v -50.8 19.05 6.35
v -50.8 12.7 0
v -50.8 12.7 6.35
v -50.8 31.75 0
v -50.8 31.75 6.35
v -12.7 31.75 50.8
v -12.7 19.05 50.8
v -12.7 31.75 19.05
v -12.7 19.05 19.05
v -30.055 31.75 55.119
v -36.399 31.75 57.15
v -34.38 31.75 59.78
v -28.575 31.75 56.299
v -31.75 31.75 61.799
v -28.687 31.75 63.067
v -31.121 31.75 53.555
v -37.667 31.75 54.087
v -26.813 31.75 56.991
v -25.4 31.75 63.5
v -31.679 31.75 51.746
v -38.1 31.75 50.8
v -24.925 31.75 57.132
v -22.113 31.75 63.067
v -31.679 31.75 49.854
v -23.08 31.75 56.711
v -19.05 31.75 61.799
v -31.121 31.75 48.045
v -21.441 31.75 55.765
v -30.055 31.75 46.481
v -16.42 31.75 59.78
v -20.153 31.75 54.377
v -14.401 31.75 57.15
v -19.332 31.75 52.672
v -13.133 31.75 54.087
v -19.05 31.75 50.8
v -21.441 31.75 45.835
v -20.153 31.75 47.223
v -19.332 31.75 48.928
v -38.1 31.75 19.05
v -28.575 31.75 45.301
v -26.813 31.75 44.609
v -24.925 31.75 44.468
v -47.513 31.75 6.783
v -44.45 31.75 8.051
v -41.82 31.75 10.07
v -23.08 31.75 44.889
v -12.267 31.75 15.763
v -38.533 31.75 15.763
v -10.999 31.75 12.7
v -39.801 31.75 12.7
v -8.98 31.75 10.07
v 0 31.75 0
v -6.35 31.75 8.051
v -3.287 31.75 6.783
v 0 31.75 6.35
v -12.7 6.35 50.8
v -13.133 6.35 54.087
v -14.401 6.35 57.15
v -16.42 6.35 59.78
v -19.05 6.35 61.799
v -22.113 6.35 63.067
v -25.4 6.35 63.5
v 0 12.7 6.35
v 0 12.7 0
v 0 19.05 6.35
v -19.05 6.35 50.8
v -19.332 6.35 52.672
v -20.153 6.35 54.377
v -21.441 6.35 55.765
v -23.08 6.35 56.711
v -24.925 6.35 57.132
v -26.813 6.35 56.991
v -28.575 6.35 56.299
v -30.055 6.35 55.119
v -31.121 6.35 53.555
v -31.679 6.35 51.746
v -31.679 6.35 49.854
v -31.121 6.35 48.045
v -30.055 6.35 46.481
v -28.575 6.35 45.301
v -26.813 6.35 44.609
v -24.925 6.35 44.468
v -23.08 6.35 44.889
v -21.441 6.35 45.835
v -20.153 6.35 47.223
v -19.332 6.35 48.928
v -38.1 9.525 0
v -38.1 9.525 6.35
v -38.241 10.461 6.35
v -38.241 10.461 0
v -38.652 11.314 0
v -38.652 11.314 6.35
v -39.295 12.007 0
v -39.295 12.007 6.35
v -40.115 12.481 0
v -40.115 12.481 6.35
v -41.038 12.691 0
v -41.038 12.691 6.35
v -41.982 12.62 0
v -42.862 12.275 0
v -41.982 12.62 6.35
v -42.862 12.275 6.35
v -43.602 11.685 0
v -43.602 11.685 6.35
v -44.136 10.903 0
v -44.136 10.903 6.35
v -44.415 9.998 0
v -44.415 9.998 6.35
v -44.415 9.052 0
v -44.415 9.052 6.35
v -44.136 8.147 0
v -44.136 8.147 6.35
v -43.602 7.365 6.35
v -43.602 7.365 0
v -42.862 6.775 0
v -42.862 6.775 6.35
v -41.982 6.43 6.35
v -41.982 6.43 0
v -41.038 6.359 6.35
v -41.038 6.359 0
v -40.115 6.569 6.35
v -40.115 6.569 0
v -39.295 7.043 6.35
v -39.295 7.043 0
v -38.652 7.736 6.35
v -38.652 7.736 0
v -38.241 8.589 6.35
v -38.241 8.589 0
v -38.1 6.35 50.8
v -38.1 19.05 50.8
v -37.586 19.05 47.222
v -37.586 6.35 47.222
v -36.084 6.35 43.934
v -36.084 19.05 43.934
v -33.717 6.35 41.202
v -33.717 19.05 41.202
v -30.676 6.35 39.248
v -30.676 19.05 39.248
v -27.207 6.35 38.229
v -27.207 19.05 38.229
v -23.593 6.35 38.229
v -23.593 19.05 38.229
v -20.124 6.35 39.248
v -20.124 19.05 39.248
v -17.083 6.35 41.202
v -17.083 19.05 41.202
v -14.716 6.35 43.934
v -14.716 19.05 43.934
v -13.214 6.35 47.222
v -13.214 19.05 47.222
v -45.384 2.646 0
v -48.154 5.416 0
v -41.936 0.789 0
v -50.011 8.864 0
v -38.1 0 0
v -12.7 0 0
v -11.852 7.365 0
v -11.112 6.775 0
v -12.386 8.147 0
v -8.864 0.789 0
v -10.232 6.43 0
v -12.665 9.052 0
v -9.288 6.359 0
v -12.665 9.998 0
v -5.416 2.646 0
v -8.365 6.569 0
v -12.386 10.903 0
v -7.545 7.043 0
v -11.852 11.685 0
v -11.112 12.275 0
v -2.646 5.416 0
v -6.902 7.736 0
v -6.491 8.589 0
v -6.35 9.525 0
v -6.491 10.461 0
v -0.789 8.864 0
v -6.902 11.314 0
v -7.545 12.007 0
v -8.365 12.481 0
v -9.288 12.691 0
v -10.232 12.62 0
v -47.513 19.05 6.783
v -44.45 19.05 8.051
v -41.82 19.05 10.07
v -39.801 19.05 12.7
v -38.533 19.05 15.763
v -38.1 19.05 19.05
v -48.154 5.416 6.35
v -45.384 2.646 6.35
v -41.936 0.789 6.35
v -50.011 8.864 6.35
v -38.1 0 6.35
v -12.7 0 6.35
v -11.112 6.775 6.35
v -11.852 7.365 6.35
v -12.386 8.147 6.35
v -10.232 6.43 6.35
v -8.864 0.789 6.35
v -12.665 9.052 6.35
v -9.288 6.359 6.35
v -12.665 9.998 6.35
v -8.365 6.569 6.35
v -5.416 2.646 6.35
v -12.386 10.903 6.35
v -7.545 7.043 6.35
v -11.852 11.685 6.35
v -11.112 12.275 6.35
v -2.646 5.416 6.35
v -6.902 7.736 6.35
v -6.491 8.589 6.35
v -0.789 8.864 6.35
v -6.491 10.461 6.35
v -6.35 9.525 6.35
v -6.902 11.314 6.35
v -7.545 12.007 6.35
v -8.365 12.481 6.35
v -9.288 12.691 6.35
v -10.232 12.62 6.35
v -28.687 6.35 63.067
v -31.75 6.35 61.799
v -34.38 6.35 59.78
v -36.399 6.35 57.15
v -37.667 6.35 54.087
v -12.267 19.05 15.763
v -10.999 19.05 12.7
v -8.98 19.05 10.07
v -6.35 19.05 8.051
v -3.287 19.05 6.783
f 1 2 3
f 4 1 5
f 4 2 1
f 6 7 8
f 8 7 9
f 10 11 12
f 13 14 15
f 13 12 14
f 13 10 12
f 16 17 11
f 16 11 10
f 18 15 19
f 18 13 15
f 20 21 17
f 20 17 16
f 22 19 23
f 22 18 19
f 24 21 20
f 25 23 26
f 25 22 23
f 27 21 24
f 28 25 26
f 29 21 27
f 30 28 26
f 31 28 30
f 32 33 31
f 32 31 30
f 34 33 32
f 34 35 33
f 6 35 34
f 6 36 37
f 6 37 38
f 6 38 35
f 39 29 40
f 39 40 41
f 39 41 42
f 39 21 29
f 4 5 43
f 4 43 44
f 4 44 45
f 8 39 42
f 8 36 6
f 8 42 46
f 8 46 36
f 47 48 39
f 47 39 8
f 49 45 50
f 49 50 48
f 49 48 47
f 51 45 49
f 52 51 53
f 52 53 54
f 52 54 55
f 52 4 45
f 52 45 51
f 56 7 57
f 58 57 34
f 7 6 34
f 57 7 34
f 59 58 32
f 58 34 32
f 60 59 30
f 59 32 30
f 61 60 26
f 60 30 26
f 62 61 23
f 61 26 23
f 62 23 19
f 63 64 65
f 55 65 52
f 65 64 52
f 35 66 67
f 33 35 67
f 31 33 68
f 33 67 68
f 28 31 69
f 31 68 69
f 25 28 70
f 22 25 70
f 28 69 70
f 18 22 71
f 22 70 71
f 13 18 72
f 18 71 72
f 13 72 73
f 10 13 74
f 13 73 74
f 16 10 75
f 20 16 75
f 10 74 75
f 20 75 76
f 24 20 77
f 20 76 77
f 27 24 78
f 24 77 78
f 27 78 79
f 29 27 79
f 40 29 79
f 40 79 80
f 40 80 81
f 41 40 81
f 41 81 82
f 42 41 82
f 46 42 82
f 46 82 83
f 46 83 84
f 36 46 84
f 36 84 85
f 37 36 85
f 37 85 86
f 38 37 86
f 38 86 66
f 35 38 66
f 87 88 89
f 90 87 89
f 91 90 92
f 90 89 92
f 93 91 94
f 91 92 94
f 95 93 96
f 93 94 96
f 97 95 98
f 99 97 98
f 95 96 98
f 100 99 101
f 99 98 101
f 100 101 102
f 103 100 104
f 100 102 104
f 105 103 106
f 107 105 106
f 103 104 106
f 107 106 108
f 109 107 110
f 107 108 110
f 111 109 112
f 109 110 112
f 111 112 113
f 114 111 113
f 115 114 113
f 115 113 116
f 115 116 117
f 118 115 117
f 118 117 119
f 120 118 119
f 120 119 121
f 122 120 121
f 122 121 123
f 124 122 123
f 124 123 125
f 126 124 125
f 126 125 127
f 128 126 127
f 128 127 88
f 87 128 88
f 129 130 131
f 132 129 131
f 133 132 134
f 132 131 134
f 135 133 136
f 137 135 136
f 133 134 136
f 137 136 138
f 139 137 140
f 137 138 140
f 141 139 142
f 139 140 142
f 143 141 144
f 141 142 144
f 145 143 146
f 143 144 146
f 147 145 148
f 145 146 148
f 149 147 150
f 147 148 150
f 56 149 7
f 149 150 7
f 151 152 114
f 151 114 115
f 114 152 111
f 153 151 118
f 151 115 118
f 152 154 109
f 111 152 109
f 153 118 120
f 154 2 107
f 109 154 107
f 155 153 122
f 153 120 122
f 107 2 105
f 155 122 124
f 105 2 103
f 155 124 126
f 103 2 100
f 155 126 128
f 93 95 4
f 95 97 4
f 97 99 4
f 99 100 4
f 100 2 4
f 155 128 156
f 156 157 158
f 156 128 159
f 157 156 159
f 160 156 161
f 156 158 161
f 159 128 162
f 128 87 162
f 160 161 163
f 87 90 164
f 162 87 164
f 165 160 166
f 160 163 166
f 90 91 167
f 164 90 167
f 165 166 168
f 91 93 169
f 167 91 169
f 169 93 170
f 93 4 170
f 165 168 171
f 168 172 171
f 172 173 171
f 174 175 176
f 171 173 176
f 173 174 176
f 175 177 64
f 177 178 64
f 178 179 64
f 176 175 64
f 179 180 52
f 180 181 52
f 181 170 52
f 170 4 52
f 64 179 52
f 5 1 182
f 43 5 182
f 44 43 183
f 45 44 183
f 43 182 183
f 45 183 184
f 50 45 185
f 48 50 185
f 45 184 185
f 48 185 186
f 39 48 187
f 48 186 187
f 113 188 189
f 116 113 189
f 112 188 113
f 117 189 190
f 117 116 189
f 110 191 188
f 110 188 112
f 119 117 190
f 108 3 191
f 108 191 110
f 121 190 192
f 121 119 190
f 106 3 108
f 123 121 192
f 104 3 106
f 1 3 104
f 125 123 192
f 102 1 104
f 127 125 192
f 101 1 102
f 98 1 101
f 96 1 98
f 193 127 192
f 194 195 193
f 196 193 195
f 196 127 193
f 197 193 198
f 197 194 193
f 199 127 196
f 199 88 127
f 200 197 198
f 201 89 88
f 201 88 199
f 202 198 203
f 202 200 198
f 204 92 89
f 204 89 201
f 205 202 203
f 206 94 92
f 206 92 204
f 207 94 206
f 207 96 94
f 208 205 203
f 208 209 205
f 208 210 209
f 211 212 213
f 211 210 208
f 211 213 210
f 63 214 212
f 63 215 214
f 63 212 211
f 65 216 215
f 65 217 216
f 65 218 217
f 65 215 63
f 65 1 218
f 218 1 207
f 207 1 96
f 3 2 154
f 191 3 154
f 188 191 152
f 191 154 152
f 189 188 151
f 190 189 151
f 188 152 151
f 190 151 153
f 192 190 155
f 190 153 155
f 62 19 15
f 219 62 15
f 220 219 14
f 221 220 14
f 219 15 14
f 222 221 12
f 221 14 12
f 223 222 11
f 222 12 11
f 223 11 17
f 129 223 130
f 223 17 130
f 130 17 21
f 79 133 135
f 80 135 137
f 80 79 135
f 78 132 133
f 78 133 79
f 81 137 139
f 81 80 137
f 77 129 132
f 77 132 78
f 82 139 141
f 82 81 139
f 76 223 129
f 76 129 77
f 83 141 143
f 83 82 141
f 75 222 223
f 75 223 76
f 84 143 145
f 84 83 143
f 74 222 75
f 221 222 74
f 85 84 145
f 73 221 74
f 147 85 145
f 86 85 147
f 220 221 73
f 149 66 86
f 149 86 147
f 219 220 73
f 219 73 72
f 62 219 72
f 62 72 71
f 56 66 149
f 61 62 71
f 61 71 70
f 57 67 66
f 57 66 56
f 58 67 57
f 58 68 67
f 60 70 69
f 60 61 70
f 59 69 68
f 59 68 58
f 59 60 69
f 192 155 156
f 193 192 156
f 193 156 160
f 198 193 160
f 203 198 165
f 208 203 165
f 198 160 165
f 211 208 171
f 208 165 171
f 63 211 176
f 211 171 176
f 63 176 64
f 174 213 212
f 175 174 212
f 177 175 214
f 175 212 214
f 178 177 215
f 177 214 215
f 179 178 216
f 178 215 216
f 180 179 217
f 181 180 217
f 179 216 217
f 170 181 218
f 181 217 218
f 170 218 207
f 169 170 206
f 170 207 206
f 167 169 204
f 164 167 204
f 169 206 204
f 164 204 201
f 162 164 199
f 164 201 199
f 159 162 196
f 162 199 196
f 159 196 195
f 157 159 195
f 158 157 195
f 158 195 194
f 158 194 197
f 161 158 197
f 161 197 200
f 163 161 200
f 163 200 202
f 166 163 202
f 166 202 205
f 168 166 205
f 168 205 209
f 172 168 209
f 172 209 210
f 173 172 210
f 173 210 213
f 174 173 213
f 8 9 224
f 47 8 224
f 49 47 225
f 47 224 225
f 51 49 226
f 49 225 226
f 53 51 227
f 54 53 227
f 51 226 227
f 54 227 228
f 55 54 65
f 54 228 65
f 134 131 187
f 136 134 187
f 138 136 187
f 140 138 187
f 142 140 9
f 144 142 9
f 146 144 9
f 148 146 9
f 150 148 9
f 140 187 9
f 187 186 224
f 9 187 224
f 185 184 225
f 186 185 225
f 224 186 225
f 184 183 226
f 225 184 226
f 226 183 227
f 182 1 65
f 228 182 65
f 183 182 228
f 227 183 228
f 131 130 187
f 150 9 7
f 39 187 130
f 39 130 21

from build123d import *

# Parameters (mm, degrees)
F1_DEPTH  = 6.35
F2_W      = 25.4
F2_H      = 12.7
F3_DEPTH  = 57.15
F5_DEPTH  = 12.701
F6_DEPTH  = 12.7
F7_R      = 6.35
F8_DEPTH  = 25.401
F9_W      = 12.7
F9_H      = 12.7
F10_DEPTH = 25.4
F12_DEPTH = 12.701
F13_R     = 3.175
F14_DEPTH = 6.351


with BuildPart() as f1:
    # F0 (on Top) → F1 (new body)
    with BuildSketch(Plane.XY):
        with BuildLine():
            Line((0, 31.75), (-50.8, 31.75))
            Line((-50.8, 31.75), (-50.8, 12.7))
            ThreePointArc((-50.8, 12.7), (-46.87018, 3.92982), (-38.1, 0))
            Line((-38.1, 0), (-12.7, 0))
            ThreePointArc((-12.7, 0), (-3.92982, 3.92982), (0, 12.7))
            Line((0, 12.7), (0, 31.75))
        make_face()
    extrude(amount=F1_DEPTH)

    # F2 (on face) → F3 (join)
    with BuildSketch(Plane.XY.offset(6.35)):
        with Locations((-25.4, 25.4)):
            Rectangle(F2_W, F2_H)
    extrude(amount=F3_DEPTH)

    # F4 (on face) → F5 (cut, through all)
    with BuildSketch(Plane.XZ.offset(-19.05)):
        with BuildLine():
            ThreePointArc((-25.4, 63.5), (-16.419744, 59.780256), (-12.7, 50.8))
            Line((-12.7, 50.8), (-12.7, 63.5))
            Line((-12.7, 63.5), (-25.4, 63.5))
        make_face()
        with BuildLine():
            ThreePointArc((-38.1, 50.8), (-34.380256, 59.780256), (-25.4, 63.5))
            Line((-25.4, 63.5), (-38.1, 63.5))
            Line((-38.1, 63.5), (-38.1, 50.8))
        make_face()
    extrude(amount=-F5_DEPTH, mode=Mode.SUBTRACT)

    # F4 (on face) → F6 (join)
    with BuildSketch(Plane.XZ.offset(-19.05)):
        with BuildLine():
            ThreePointArc((-38.1, 50.8), (-25.4, 38.1), (-12.7, 50.8))
            ThreePointArc((-12.7, 50.8), (-16.419744, 59.780256), (-25.4, 63.5))
            ThreePointArc((-25.4, 63.5), (-34.380256, 59.780256), (-38.1, 50.8))
        make_face()
    extrude(amount=F6_DEPTH)

    # F7 (on face) → F8 (cut, through all)
    with BuildSketch(Plane.XZ.offset(-6.35)):
        with Locations((-25.4, 50.8)):
            Circle(F7_R)
    extrude(amount=-F8_DEPTH, mode=Mode.SUBTRACT)

    # F9 (on face) → F10 (join)
    with BuildSketch(Plane.XY.offset(6.35)):
        with Locations((-44.45, 25.4)):
            Rectangle(F9_W, F9_H)
        with Locations((-6.35, 25.4)):
            Rectangle(F9_W, F9_H)
    extrude(amount=F10_DEPTH)

    # F11 (on face) → F12 (cut, through all)
    with BuildSketch(Plane.XZ.offset(-19.05)):
        with BuildLine():
            Line((-38.1, 19.05), (-38.1, 31.75))
            Line((-38.1, 31.75), (-50.8, 31.75))
            Line((-50.8, 31.75), (-50.8, 6.35))
            ThreePointArc((-50.8, 6.35), (-41.819744, 10.069744), (-38.1, 19.05))
        make_face()
        with BuildLine():
            Line((0, 31.75), (-12.7, 31.75))
            Line((-12.7, 31.75), (-12.7, 19.05))
            ThreePointArc((-12.7, 19.05), (-8.980256, 10.069744), (0, 6.35))
            Line((0, 6.35), (0, 31.75))
        make_face()
    extrude(amount=-F12_DEPTH, mode=Mode.SUBTRACT)

    # F13 (on face) → F14 (cut, through all)
    with BuildSketch(Plane.XY.offset(6.35)):
        with Locations((-41.275, 9.525)):
            Circle(F13_R)
        with Locations((-9.525, 9.525)):
            Circle(F13_R)
    extrude(amount=-F14_DEPTH, mode=Mode.SUBTRACT)


solid = f1.part
